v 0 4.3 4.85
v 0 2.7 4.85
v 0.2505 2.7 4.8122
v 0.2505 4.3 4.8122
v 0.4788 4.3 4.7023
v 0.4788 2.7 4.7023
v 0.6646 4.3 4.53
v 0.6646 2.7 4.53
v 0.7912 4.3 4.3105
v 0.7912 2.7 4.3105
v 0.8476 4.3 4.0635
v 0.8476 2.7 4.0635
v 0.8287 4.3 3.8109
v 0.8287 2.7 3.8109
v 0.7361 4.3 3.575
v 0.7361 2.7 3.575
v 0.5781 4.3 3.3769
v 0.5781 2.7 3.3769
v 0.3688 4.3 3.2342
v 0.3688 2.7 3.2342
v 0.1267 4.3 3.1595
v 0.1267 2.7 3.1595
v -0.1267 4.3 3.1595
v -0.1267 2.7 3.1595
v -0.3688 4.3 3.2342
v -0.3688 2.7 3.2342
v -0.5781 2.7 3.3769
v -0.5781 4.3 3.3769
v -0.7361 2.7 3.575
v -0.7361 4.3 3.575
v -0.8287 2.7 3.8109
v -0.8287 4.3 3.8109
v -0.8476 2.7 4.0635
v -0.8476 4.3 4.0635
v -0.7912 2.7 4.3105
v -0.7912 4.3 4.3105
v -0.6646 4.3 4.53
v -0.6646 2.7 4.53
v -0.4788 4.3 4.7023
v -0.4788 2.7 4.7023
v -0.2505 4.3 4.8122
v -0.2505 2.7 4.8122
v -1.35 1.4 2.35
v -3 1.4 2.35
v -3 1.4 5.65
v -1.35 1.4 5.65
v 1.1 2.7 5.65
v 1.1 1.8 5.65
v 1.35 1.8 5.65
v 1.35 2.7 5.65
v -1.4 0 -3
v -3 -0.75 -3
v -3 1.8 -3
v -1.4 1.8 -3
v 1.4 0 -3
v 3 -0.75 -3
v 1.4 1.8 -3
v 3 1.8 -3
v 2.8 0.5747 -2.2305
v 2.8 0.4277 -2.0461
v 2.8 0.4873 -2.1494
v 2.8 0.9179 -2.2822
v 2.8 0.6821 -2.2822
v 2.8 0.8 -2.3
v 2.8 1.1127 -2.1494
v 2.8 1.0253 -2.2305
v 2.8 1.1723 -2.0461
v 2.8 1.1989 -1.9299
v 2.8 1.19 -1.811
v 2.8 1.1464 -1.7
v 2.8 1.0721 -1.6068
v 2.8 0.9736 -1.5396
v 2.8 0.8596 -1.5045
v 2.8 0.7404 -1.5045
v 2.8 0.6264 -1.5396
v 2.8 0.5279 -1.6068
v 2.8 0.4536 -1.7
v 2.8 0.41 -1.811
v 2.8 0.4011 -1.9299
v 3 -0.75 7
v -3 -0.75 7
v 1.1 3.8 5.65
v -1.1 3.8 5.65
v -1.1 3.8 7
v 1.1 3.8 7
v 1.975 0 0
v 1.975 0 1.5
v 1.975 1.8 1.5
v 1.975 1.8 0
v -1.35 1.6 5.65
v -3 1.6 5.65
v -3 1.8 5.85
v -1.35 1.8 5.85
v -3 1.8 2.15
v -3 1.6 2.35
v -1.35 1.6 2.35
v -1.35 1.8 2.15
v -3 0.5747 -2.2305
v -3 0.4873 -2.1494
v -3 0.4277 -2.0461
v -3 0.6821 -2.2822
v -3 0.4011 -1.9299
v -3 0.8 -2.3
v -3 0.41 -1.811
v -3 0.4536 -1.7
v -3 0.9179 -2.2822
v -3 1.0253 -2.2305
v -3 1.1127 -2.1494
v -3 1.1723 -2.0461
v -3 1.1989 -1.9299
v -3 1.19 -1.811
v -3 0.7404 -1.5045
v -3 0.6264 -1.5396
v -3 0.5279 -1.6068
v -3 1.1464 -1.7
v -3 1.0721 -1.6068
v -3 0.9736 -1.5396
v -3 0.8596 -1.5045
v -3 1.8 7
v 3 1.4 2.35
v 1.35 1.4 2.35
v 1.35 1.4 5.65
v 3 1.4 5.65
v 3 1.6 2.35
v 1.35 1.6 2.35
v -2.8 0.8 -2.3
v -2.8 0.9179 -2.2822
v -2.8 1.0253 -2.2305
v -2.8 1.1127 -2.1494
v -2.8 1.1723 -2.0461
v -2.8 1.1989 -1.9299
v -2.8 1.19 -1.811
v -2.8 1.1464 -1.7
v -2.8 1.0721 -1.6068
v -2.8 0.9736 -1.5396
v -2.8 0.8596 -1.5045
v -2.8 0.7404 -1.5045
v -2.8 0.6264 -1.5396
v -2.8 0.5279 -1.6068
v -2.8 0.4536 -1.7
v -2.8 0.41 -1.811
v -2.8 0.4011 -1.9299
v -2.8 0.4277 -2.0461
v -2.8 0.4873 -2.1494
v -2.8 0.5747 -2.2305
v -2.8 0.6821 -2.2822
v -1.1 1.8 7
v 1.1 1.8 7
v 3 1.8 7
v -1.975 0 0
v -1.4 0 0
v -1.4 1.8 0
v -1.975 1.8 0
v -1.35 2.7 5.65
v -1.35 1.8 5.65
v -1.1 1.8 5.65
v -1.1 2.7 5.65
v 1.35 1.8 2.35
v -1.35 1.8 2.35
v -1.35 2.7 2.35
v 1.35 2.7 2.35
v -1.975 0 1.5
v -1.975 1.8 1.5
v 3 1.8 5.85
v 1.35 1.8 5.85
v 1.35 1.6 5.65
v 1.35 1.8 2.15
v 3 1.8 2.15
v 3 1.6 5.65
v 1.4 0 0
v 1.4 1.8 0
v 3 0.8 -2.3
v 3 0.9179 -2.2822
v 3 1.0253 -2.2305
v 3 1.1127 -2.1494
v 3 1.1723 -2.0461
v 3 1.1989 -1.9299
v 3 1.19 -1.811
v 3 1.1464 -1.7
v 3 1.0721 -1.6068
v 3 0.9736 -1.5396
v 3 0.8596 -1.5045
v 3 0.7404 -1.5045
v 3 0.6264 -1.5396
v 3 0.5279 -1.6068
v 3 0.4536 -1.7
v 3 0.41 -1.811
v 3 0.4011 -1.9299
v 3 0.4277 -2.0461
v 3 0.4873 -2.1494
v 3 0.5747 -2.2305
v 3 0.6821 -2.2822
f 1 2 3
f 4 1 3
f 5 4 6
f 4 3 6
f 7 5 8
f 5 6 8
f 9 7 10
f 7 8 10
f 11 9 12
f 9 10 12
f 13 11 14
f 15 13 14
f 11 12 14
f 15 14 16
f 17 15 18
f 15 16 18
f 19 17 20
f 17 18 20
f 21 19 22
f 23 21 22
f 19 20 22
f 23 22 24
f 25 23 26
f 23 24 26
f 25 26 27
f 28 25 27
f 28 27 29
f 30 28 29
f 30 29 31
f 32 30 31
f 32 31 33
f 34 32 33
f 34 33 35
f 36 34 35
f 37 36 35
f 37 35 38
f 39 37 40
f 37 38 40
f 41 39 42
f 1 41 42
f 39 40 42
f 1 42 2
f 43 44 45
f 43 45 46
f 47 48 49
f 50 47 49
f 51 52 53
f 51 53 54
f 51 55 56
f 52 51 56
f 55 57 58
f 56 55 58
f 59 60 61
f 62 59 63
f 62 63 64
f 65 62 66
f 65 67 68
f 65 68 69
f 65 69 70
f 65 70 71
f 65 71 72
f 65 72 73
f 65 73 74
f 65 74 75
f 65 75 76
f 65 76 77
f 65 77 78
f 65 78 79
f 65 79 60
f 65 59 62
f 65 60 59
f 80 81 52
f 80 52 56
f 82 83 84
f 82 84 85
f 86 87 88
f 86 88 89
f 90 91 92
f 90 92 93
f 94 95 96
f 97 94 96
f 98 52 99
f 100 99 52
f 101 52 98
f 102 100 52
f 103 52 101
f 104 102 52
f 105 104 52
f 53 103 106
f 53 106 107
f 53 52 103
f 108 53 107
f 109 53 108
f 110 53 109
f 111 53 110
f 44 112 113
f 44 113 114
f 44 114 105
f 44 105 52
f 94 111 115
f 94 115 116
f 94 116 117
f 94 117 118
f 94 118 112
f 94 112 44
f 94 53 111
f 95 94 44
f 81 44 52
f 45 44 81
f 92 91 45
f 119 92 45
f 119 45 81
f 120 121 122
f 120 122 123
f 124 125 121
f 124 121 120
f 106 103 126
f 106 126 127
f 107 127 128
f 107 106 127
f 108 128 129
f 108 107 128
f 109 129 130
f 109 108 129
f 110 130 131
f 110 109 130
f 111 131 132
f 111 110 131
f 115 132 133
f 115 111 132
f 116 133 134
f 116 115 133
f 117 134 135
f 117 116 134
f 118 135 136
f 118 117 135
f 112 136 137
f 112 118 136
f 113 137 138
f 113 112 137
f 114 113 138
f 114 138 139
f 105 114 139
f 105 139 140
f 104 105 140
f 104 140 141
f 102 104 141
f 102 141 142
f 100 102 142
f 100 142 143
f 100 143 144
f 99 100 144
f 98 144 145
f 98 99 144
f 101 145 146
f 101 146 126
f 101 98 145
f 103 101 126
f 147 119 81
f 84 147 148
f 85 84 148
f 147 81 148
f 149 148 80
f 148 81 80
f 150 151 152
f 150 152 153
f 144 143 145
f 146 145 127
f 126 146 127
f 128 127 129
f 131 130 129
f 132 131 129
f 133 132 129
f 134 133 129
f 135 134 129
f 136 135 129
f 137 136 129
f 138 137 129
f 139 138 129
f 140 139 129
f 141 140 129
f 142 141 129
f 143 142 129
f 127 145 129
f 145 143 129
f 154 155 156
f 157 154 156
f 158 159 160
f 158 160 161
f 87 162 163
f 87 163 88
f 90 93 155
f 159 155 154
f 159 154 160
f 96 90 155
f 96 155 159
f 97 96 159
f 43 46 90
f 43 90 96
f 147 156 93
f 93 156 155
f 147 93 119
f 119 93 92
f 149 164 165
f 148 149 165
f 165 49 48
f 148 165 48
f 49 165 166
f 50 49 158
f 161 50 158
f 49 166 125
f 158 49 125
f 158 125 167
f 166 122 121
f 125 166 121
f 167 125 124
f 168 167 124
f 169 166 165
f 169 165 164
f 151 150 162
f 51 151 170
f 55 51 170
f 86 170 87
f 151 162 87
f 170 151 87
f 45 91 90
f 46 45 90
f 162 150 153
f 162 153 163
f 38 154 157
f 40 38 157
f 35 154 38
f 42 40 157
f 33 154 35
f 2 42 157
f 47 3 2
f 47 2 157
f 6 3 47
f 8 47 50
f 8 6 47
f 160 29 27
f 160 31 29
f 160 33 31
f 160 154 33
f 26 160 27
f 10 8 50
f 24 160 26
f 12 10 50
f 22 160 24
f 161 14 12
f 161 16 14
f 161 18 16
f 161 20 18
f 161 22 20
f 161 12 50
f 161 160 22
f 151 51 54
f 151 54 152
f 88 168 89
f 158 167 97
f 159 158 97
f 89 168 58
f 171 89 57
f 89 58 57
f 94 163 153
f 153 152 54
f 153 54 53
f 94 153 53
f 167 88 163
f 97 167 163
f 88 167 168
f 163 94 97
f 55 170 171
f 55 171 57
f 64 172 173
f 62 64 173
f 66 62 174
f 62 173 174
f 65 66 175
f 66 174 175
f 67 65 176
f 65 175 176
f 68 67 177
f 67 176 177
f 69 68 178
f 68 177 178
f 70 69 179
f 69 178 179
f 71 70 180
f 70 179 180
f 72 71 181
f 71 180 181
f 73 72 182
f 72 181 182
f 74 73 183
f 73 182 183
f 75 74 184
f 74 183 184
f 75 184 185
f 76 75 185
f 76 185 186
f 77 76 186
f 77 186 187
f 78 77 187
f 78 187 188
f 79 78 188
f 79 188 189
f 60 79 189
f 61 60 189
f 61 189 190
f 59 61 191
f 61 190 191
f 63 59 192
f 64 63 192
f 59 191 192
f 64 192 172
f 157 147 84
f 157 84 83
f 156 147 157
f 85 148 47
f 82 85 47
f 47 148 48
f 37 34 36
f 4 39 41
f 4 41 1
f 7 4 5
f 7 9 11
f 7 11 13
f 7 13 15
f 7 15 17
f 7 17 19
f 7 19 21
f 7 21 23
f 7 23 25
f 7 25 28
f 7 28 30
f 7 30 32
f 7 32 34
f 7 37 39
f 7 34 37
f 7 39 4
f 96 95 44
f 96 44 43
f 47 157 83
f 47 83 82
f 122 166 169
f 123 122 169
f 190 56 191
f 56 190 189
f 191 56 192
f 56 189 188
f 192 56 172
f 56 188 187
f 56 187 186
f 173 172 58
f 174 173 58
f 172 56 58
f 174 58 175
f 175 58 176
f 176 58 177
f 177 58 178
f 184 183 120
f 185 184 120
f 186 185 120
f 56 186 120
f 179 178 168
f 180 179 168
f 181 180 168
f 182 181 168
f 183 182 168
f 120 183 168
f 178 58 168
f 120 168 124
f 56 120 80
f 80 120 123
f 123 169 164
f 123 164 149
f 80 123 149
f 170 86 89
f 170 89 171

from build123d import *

# Parameters (mm, degrees)
BOSS_EXTRUDE1_DEPTH = 1.8
SKETCH2_W           = 6
SKETCH2_H           = 10
BOSS_EXTRUDE2_DEPTH = 0.75
SKETCH3_W           = 2.7
SKETCH3_H           = 3.3
BOSS_EXTRUDE3_DEPTH = 0.9
SKETCH4_R           = 0.85
BOSS_EXTRUDE4_DEPTH = 1.6
SKETCH5_W           = 2.2
SKETCH5_H           = 1.35
BOSS_EXTRUDE5_DEPTH = 2
SKETCH7_W           = 1.65
SKETCH7_H           = 3.3
CUT_EXTRUDE2_DEPTH  = 0.4
CHAMFER1_SIZE       = 0.2
SKETCH9_R           = 0.4
CUT_EXTRUDE4_DEPTH  = 0.2


with BuildPart() as part:
    # Sketch1 → Boss-Extrude1 (new body)
    with BuildSketch(Plane(origin=(0, 0, 0), x_dir=(1, 0, 0), z_dir=(0, 1, 0))):
        Polygon((-1.4, 3), (-1.4, 0), (-1.975, 0), (-1.975, -1.5), (1.975, -1.5), (1.975, 0), (1.4, 0), (1.4, 3), (3, 3), (3, -7), (-3, -7), (-3, 3), align=None)
    extrude(amount=BOSS_EXTRUDE1_DEPTH)

    # Sketch2 → Boss-Extrude2 (add)
    with BuildSketch(Plane.XZ):
        with Locations((0, 2)):
            Rectangle(SKETCH2_W, SKETCH2_H)
    extrude(amount=BOSS_EXTRUDE2_DEPTH)

    # Sketch3 → Boss-Extrude3 (add)
    with BuildSketch(Plane(origin=(0, 1.8, 0), x_dir=(1, 0, 0), z_dir=(0, 1, 0))):
        with Locations((0, -4)):
            Rectangle(SKETCH3_W, SKETCH3_H)
    extrude(amount=BOSS_EXTRUDE3_DEPTH)

    # Sketch4 → Boss-Extrude4 (add)
    with BuildSketch(Plane(origin=(0, 2.7, 0), x_dir=(1, 0, 0), z_dir=(0, 1, 0))):
        with Locations(Location((0, -4, 0), (0, 0, 270))):
            Circle(SKETCH4_R)
    extrude(amount=BOSS_EXTRUDE4_DEPTH)

    # Sketch5 → Boss-Extrude5 (add)
    with BuildSketch(Plane(origin=(0, 1.8, 0), x_dir=(1, 0, 0), z_dir=(0, 1, 0))):
        with Locations((0, -6.325)):
            Rectangle(SKETCH5_W, SKETCH5_H)
    extrude(amount=BOSS_EXTRUDE5_DEPTH)

    # Sketch7 → Cut-Extrude2 (cut)
    with BuildSketch(Plane(origin=(0, 1.8, 0), x_dir=(1, 0, 0), z_dir=(0, 1, 0))):
        with Locations((-2.175, -4)):
            Rectangle(SKETCH7_W, SKETCH7_H)
        with Locations((2.175, -4)):
            Rectangle(SKETCH7_W, SKETCH7_H)
    extrude(amount=-CUT_EXTRUDE2_DEPTH, mode=Mode.SUBTRACT)

    # Chamfer1
    chamfer1_edges = [part.edges().sort_by_distance(p)[0] for p in [
        (-2.175, 1.8, 2.35),
        (-2.175, 1.8, 5.65),
        (2.175, 1.8, 5.65),
        (2.175, 1.8, 2.35),
    ]]
    chamfer(chamfer1_edges, length=CHAMFER1_SIZE)

    # Sketch9 → Cut-Extrude4 (cut)
    with BuildSketch(Plane(origin=(3, 0, 0), x_dir=(0, 0, -1), z_dir=(1, 0, 0))):
        with Locations((1.9, 0.8)):
            Circle(SKETCH9_R)
    cut_extrude4 = extrude(amount=-CUT_EXTRUDE4_DEPTH, mode=Mode.SUBTRACT)

    # Mirror1: Cut-Extrude4 across plane
    add(cut_extrude4.mirror(Plane(origin=(0, 0, 0), x_dir=(0, 0, 1), z_dir=(1, 0, 0))), mode=Mode.SUBTRACT)


solid = part.part
